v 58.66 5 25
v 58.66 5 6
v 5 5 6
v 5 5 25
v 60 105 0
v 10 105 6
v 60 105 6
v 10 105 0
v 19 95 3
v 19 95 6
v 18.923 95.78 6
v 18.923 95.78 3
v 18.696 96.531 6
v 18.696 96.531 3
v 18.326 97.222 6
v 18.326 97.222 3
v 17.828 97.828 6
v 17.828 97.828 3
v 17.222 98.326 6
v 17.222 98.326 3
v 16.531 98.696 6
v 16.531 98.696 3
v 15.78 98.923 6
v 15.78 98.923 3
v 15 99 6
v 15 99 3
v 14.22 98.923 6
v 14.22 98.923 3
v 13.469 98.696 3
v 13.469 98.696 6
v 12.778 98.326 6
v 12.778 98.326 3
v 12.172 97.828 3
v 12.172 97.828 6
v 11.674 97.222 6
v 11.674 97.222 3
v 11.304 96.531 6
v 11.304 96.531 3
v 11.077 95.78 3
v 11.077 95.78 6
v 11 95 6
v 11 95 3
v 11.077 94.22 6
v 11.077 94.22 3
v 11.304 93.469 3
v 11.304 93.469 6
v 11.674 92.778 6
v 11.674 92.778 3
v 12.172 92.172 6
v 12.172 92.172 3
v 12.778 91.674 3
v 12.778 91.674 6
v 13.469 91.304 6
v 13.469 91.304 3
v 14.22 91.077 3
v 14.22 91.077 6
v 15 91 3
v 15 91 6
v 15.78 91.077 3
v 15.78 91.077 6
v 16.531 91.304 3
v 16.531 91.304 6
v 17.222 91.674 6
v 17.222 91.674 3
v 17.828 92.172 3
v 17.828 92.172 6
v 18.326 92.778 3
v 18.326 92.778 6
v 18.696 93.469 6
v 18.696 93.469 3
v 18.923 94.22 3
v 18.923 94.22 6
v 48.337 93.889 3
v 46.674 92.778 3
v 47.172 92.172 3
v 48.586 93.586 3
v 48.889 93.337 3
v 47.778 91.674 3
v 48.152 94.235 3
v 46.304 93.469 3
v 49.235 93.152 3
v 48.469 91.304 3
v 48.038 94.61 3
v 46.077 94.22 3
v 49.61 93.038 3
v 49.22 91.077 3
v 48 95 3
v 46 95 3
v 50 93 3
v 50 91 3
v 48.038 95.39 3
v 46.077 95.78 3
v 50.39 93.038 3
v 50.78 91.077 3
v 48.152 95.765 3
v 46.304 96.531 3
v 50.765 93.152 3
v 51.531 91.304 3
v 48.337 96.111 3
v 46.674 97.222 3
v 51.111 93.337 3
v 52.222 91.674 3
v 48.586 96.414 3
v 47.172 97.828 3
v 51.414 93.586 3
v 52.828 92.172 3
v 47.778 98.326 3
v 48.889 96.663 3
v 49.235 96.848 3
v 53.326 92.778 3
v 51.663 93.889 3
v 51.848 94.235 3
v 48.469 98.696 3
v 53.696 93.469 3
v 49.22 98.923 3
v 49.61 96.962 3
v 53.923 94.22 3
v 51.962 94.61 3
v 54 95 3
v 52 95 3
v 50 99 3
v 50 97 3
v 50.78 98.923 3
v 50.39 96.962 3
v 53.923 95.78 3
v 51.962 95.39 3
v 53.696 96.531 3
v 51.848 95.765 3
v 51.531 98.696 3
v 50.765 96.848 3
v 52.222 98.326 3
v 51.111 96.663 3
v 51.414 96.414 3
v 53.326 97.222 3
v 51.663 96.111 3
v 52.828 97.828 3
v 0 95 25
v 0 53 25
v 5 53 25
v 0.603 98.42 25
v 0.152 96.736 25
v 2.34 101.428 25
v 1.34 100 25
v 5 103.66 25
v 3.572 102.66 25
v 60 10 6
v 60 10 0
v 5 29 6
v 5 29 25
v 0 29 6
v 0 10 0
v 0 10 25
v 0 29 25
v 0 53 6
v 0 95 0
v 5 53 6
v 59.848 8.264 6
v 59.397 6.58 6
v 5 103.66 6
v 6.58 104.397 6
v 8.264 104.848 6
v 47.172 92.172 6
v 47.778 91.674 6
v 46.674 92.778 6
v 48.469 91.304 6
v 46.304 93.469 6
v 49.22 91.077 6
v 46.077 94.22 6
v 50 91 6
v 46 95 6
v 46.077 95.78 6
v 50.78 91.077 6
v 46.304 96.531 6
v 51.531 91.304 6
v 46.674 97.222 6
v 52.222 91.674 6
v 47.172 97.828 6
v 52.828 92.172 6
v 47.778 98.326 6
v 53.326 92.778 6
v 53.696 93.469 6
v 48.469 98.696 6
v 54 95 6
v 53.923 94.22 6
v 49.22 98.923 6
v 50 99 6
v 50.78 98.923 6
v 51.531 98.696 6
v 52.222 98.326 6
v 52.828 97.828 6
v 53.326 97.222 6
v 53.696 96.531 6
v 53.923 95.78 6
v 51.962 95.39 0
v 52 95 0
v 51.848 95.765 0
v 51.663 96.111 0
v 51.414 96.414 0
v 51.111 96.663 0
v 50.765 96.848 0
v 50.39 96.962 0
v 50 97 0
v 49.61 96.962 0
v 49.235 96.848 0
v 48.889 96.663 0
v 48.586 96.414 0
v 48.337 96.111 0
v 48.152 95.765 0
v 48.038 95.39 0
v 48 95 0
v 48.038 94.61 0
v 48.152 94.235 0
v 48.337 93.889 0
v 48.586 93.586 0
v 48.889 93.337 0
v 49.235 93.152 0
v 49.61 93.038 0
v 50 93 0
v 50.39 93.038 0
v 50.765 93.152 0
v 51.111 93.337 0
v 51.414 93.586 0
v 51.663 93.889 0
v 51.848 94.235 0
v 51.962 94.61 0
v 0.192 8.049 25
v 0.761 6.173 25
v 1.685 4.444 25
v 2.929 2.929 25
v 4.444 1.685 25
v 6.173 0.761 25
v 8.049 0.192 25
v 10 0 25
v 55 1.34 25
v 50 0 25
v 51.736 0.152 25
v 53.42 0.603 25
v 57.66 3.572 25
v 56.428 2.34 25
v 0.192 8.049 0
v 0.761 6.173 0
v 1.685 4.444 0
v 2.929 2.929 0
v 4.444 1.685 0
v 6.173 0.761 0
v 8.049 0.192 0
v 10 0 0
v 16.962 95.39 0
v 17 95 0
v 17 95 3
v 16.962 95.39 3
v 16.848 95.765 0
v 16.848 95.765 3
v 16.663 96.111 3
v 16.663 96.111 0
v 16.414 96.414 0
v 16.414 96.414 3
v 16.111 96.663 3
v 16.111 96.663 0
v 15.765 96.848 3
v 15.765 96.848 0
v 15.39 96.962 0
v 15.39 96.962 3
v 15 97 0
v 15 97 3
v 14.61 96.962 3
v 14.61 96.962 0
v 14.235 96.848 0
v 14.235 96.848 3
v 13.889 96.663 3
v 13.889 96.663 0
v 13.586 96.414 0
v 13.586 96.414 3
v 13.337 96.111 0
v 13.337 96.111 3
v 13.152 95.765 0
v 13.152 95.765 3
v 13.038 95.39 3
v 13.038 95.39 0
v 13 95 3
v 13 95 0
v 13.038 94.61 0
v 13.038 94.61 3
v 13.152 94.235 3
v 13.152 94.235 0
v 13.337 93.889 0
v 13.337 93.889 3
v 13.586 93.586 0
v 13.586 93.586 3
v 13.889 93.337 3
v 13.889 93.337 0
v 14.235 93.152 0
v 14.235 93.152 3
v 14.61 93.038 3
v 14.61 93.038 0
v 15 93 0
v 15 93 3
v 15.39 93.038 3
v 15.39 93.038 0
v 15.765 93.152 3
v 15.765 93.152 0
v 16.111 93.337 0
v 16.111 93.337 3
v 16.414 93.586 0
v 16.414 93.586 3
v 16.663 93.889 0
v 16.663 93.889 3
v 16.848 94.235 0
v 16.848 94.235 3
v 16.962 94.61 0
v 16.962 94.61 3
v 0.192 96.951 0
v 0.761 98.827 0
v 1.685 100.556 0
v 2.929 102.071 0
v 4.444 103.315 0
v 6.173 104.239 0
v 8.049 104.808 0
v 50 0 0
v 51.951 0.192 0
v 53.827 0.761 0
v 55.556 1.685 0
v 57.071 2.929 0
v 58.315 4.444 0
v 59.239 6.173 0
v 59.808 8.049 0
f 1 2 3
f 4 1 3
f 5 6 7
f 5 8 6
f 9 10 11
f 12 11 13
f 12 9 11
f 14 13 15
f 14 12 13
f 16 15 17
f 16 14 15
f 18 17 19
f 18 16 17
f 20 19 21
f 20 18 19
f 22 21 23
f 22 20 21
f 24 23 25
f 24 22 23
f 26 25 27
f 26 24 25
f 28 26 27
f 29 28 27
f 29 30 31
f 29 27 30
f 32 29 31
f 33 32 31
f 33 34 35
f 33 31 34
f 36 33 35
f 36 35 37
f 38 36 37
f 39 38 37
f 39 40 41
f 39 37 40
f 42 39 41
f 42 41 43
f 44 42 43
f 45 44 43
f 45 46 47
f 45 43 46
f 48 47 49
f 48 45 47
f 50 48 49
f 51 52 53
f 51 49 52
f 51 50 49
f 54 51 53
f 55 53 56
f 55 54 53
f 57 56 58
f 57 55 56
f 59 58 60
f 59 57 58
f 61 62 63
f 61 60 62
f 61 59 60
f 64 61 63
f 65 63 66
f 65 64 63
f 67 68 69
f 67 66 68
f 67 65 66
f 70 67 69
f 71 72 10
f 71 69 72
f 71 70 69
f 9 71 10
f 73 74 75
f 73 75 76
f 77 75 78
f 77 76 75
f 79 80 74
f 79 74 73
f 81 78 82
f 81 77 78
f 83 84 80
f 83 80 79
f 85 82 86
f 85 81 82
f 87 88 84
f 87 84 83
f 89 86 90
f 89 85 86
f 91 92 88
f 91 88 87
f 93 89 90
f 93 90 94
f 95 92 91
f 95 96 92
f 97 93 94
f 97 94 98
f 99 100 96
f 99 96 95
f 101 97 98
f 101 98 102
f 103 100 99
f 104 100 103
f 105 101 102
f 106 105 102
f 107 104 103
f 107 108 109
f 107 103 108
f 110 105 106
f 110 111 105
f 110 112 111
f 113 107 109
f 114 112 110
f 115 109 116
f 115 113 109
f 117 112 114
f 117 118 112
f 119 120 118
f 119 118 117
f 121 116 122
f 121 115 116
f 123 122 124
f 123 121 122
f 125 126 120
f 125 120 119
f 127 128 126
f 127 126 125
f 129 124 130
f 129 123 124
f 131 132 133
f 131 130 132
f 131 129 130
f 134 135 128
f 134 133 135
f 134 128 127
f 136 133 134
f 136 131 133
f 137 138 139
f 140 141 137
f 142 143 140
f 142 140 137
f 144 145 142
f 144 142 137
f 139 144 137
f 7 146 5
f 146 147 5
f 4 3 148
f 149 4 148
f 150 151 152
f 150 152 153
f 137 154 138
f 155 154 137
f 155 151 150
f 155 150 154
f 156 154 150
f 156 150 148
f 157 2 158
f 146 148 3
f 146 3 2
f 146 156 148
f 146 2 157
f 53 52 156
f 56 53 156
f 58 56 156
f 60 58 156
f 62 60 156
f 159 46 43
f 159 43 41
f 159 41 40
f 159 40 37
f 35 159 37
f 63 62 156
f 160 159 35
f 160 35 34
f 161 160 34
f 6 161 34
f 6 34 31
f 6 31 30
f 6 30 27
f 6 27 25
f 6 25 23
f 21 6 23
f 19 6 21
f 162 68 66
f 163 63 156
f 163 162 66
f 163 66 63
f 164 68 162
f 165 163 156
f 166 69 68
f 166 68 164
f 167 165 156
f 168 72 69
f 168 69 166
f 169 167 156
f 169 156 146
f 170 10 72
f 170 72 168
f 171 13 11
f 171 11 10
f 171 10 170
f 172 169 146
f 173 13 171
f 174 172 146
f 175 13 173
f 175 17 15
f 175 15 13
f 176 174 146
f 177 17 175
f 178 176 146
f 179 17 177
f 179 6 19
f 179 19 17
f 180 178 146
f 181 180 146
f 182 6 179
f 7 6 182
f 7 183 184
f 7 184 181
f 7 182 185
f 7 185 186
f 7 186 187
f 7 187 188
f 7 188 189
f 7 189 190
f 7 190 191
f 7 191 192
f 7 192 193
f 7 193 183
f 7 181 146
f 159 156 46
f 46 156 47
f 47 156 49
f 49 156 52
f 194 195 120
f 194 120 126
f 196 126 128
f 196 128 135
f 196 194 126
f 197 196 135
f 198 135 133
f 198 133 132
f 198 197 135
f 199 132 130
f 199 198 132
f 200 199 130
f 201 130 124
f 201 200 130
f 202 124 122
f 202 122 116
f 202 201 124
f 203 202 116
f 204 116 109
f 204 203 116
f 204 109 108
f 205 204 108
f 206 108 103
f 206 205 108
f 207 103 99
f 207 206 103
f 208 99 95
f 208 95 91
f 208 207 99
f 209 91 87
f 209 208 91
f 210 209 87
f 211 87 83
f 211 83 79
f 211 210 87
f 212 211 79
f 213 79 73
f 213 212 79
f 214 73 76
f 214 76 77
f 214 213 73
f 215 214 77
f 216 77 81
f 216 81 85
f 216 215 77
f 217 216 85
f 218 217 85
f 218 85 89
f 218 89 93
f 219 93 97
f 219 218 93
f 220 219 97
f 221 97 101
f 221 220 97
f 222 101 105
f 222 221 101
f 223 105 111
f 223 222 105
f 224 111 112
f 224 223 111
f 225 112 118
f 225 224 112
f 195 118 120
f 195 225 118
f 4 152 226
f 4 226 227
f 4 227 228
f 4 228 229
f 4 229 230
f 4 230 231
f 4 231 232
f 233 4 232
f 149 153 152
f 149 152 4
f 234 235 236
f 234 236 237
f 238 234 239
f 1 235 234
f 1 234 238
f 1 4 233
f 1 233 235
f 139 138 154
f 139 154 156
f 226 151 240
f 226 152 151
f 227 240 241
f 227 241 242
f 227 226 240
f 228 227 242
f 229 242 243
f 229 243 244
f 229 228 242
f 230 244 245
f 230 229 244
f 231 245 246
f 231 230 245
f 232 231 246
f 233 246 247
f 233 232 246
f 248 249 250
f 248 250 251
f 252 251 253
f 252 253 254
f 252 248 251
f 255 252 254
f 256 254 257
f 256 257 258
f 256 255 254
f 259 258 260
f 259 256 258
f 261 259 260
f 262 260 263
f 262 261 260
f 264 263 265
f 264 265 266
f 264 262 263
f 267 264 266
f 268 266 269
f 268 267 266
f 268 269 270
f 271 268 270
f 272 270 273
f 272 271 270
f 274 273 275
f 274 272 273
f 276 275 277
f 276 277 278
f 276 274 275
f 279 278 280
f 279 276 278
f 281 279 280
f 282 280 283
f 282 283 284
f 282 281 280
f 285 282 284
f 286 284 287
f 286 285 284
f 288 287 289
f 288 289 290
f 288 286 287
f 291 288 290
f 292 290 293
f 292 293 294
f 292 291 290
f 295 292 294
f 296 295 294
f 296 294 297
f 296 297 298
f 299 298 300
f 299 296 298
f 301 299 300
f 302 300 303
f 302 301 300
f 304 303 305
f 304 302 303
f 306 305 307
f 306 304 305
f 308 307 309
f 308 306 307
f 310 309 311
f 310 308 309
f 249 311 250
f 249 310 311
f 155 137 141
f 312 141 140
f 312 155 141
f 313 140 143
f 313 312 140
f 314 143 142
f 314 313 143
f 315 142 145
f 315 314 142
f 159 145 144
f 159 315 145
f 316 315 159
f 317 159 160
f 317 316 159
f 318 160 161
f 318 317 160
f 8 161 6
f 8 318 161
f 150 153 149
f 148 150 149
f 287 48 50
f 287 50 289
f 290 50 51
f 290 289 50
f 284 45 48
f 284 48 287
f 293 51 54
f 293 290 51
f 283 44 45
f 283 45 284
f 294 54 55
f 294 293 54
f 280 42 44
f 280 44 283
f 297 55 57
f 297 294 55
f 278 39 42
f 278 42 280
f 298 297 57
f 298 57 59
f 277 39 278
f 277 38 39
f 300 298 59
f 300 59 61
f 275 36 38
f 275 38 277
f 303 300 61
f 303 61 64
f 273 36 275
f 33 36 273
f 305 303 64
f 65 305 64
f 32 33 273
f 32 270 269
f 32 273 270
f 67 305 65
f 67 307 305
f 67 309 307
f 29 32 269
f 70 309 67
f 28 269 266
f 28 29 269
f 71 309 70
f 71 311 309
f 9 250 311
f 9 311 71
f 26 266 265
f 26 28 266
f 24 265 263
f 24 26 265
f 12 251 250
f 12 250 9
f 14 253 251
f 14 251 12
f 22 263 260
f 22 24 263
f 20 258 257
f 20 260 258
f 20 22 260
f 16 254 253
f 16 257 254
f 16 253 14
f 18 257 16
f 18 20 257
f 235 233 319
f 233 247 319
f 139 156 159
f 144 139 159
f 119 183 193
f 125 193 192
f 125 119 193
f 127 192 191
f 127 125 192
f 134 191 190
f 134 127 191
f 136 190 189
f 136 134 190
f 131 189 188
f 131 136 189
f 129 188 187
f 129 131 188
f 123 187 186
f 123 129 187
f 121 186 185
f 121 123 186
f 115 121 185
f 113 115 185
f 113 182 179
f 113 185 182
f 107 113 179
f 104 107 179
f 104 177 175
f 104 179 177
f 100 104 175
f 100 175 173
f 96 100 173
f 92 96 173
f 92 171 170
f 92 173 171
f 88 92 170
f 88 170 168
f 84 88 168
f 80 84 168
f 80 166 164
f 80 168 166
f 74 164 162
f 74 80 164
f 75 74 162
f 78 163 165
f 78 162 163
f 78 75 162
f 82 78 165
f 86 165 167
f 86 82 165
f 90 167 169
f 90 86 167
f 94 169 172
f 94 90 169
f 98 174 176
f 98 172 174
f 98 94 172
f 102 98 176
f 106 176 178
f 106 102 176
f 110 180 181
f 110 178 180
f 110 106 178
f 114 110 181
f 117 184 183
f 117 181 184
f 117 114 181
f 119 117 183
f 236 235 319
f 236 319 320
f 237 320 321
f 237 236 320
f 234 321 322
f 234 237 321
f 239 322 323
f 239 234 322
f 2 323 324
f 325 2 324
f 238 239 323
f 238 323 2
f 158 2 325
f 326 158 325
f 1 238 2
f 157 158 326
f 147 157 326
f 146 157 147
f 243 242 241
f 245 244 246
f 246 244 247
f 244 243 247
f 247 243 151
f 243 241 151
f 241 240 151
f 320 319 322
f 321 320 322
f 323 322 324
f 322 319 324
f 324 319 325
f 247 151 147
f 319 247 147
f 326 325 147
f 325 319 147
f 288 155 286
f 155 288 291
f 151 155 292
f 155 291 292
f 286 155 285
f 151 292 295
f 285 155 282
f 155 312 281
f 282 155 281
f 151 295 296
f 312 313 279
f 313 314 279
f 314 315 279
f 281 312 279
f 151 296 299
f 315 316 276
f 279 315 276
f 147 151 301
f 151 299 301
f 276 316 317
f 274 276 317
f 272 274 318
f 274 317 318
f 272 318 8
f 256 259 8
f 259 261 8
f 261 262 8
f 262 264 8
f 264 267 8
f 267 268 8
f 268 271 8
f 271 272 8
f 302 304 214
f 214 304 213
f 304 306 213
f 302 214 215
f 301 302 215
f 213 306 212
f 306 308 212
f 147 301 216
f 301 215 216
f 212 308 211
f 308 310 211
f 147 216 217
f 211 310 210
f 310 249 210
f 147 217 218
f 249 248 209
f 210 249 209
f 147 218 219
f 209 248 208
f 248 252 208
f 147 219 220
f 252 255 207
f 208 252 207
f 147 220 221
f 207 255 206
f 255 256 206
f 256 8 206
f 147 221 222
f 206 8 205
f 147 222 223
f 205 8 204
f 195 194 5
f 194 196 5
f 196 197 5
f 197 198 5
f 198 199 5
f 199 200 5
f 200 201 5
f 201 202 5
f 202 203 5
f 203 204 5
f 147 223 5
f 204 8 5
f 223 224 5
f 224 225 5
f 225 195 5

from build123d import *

# Parameters (mm, degrees)
SKETCH1_W           = 60
SKETCH1_H           = 105
BOSS_EXTRUDE4_DEPTH = 6
BOSS_EXTRUDE5_DEPTH = 25
SKETCH1_15_R        = 2
CUT_EXTRUDE1_DEPTH  = 25
SKETCH1_16_R        = 4
SKETCH1_16_R_2      = 2
CUT_EXTRUDE2_DEPTH  = 25
SKETCH1_18_R        = 4
SKETCH1_18_R_2      = 2
BOSS_EXTRUDE7_DEPTH = 3
FILLET1_R           = 10
SKETCH2_W           = 5
SKETCH2_H           = 24
CUT_EXTRUDE3_DEPTH  = 19


with BuildPart() as part:
    # Sketch1 → Boss-Extrude4 (new body)
    with BuildSketch(Plane.XY):
        with Locations((30, 52.5)):
            Rectangle(SKETCH1_W, SKETCH1_H)
    extrude(amount=BOSS_EXTRUDE4_DEPTH)

    # Sketch1<12> → Boss-Extrude5 (add)
    with BuildSketch(Plane.XY):
        Polygon((5, 5), (5, 105), (0, 105), (0, 0), (60, 0), (60, 5), align=None)
    extrude(amount=BOSS_EXTRUDE5_DEPTH)

    # Sketch1<15> → Cut-Extrude1 (cut)
    with BuildSketch(Plane.XY):
        with Locations((50, 95)):
            Circle(SKETCH1_15_R)
        with Locations((15, 95)):
            Circle(SKETCH1_15_R)
    extrude(amount=CUT_EXTRUDE1_DEPTH, mode=Mode.SUBTRACT)

    # Sketch1<16> → Cut-Extrude2 (cut)
    # profile 1 of 2: a face of its own
    with BuildSketch(Plane.XY):
        with Locations((50, 95)):
            Circle(SKETCH1_16_R)
        with Locations((50, 95)):
            Circle(SKETCH1_16_R_2, mode=Mode.SUBTRACT)
    # profile 2 of 2: a face of its own
    with BuildSketch(Plane.XY):
        with Locations((15, 95)):
            Circle(SKETCH1_16_R)
        with Locations((15, 95)):
            Circle(SKETCH1_16_R_2, mode=Mode.SUBTRACT)
    extrude(amount=CUT_EXTRUDE2_DEPTH, mode=Mode.SUBTRACT)

    # Sketch1<18> → Boss-Extrude7 (add)
    # profile 1 of 2: a face of its own
    with BuildSketch(Plane.XY):
        with Locations((50, 95)):
            Circle(SKETCH1_18_R)
        with Locations((50, 95)):
            Circle(SKETCH1_18_R_2, mode=Mode.SUBTRACT)
    # profile 2 of 2: a face of its own
    with BuildSketch(Plane.XY):
        with Locations((15, 95)):
            Circle(SKETCH1_18_R)
        with Locations((15, 95)):
            Circle(SKETCH1_18_R_2, mode=Mode.SUBTRACT)
    extrude(amount=BOSS_EXTRUDE7_DEPTH)

    # Fillet1
    fillet1_edges = [part.edges().sort_by_distance(p)[0] for p in [
        (60, 0, 12.5),
        (0, 105, 12.5),
        (0, 0, 12.5),
    ]]
    fillet(fillet1_edges, radius=FILLET1_R)

    # Sketch2 → Cut-Extrude3 (cut)
    with BuildSketch(Plane.XY.offset(25)):
        with Locations((2.5, 41)):
            Rectangle(SKETCH2_W, SKETCH2_H)
    extrude(amount=-CUT_EXTRUDE3_DEPTH, mode=Mode.SUBTRACT)


solid = part.part
